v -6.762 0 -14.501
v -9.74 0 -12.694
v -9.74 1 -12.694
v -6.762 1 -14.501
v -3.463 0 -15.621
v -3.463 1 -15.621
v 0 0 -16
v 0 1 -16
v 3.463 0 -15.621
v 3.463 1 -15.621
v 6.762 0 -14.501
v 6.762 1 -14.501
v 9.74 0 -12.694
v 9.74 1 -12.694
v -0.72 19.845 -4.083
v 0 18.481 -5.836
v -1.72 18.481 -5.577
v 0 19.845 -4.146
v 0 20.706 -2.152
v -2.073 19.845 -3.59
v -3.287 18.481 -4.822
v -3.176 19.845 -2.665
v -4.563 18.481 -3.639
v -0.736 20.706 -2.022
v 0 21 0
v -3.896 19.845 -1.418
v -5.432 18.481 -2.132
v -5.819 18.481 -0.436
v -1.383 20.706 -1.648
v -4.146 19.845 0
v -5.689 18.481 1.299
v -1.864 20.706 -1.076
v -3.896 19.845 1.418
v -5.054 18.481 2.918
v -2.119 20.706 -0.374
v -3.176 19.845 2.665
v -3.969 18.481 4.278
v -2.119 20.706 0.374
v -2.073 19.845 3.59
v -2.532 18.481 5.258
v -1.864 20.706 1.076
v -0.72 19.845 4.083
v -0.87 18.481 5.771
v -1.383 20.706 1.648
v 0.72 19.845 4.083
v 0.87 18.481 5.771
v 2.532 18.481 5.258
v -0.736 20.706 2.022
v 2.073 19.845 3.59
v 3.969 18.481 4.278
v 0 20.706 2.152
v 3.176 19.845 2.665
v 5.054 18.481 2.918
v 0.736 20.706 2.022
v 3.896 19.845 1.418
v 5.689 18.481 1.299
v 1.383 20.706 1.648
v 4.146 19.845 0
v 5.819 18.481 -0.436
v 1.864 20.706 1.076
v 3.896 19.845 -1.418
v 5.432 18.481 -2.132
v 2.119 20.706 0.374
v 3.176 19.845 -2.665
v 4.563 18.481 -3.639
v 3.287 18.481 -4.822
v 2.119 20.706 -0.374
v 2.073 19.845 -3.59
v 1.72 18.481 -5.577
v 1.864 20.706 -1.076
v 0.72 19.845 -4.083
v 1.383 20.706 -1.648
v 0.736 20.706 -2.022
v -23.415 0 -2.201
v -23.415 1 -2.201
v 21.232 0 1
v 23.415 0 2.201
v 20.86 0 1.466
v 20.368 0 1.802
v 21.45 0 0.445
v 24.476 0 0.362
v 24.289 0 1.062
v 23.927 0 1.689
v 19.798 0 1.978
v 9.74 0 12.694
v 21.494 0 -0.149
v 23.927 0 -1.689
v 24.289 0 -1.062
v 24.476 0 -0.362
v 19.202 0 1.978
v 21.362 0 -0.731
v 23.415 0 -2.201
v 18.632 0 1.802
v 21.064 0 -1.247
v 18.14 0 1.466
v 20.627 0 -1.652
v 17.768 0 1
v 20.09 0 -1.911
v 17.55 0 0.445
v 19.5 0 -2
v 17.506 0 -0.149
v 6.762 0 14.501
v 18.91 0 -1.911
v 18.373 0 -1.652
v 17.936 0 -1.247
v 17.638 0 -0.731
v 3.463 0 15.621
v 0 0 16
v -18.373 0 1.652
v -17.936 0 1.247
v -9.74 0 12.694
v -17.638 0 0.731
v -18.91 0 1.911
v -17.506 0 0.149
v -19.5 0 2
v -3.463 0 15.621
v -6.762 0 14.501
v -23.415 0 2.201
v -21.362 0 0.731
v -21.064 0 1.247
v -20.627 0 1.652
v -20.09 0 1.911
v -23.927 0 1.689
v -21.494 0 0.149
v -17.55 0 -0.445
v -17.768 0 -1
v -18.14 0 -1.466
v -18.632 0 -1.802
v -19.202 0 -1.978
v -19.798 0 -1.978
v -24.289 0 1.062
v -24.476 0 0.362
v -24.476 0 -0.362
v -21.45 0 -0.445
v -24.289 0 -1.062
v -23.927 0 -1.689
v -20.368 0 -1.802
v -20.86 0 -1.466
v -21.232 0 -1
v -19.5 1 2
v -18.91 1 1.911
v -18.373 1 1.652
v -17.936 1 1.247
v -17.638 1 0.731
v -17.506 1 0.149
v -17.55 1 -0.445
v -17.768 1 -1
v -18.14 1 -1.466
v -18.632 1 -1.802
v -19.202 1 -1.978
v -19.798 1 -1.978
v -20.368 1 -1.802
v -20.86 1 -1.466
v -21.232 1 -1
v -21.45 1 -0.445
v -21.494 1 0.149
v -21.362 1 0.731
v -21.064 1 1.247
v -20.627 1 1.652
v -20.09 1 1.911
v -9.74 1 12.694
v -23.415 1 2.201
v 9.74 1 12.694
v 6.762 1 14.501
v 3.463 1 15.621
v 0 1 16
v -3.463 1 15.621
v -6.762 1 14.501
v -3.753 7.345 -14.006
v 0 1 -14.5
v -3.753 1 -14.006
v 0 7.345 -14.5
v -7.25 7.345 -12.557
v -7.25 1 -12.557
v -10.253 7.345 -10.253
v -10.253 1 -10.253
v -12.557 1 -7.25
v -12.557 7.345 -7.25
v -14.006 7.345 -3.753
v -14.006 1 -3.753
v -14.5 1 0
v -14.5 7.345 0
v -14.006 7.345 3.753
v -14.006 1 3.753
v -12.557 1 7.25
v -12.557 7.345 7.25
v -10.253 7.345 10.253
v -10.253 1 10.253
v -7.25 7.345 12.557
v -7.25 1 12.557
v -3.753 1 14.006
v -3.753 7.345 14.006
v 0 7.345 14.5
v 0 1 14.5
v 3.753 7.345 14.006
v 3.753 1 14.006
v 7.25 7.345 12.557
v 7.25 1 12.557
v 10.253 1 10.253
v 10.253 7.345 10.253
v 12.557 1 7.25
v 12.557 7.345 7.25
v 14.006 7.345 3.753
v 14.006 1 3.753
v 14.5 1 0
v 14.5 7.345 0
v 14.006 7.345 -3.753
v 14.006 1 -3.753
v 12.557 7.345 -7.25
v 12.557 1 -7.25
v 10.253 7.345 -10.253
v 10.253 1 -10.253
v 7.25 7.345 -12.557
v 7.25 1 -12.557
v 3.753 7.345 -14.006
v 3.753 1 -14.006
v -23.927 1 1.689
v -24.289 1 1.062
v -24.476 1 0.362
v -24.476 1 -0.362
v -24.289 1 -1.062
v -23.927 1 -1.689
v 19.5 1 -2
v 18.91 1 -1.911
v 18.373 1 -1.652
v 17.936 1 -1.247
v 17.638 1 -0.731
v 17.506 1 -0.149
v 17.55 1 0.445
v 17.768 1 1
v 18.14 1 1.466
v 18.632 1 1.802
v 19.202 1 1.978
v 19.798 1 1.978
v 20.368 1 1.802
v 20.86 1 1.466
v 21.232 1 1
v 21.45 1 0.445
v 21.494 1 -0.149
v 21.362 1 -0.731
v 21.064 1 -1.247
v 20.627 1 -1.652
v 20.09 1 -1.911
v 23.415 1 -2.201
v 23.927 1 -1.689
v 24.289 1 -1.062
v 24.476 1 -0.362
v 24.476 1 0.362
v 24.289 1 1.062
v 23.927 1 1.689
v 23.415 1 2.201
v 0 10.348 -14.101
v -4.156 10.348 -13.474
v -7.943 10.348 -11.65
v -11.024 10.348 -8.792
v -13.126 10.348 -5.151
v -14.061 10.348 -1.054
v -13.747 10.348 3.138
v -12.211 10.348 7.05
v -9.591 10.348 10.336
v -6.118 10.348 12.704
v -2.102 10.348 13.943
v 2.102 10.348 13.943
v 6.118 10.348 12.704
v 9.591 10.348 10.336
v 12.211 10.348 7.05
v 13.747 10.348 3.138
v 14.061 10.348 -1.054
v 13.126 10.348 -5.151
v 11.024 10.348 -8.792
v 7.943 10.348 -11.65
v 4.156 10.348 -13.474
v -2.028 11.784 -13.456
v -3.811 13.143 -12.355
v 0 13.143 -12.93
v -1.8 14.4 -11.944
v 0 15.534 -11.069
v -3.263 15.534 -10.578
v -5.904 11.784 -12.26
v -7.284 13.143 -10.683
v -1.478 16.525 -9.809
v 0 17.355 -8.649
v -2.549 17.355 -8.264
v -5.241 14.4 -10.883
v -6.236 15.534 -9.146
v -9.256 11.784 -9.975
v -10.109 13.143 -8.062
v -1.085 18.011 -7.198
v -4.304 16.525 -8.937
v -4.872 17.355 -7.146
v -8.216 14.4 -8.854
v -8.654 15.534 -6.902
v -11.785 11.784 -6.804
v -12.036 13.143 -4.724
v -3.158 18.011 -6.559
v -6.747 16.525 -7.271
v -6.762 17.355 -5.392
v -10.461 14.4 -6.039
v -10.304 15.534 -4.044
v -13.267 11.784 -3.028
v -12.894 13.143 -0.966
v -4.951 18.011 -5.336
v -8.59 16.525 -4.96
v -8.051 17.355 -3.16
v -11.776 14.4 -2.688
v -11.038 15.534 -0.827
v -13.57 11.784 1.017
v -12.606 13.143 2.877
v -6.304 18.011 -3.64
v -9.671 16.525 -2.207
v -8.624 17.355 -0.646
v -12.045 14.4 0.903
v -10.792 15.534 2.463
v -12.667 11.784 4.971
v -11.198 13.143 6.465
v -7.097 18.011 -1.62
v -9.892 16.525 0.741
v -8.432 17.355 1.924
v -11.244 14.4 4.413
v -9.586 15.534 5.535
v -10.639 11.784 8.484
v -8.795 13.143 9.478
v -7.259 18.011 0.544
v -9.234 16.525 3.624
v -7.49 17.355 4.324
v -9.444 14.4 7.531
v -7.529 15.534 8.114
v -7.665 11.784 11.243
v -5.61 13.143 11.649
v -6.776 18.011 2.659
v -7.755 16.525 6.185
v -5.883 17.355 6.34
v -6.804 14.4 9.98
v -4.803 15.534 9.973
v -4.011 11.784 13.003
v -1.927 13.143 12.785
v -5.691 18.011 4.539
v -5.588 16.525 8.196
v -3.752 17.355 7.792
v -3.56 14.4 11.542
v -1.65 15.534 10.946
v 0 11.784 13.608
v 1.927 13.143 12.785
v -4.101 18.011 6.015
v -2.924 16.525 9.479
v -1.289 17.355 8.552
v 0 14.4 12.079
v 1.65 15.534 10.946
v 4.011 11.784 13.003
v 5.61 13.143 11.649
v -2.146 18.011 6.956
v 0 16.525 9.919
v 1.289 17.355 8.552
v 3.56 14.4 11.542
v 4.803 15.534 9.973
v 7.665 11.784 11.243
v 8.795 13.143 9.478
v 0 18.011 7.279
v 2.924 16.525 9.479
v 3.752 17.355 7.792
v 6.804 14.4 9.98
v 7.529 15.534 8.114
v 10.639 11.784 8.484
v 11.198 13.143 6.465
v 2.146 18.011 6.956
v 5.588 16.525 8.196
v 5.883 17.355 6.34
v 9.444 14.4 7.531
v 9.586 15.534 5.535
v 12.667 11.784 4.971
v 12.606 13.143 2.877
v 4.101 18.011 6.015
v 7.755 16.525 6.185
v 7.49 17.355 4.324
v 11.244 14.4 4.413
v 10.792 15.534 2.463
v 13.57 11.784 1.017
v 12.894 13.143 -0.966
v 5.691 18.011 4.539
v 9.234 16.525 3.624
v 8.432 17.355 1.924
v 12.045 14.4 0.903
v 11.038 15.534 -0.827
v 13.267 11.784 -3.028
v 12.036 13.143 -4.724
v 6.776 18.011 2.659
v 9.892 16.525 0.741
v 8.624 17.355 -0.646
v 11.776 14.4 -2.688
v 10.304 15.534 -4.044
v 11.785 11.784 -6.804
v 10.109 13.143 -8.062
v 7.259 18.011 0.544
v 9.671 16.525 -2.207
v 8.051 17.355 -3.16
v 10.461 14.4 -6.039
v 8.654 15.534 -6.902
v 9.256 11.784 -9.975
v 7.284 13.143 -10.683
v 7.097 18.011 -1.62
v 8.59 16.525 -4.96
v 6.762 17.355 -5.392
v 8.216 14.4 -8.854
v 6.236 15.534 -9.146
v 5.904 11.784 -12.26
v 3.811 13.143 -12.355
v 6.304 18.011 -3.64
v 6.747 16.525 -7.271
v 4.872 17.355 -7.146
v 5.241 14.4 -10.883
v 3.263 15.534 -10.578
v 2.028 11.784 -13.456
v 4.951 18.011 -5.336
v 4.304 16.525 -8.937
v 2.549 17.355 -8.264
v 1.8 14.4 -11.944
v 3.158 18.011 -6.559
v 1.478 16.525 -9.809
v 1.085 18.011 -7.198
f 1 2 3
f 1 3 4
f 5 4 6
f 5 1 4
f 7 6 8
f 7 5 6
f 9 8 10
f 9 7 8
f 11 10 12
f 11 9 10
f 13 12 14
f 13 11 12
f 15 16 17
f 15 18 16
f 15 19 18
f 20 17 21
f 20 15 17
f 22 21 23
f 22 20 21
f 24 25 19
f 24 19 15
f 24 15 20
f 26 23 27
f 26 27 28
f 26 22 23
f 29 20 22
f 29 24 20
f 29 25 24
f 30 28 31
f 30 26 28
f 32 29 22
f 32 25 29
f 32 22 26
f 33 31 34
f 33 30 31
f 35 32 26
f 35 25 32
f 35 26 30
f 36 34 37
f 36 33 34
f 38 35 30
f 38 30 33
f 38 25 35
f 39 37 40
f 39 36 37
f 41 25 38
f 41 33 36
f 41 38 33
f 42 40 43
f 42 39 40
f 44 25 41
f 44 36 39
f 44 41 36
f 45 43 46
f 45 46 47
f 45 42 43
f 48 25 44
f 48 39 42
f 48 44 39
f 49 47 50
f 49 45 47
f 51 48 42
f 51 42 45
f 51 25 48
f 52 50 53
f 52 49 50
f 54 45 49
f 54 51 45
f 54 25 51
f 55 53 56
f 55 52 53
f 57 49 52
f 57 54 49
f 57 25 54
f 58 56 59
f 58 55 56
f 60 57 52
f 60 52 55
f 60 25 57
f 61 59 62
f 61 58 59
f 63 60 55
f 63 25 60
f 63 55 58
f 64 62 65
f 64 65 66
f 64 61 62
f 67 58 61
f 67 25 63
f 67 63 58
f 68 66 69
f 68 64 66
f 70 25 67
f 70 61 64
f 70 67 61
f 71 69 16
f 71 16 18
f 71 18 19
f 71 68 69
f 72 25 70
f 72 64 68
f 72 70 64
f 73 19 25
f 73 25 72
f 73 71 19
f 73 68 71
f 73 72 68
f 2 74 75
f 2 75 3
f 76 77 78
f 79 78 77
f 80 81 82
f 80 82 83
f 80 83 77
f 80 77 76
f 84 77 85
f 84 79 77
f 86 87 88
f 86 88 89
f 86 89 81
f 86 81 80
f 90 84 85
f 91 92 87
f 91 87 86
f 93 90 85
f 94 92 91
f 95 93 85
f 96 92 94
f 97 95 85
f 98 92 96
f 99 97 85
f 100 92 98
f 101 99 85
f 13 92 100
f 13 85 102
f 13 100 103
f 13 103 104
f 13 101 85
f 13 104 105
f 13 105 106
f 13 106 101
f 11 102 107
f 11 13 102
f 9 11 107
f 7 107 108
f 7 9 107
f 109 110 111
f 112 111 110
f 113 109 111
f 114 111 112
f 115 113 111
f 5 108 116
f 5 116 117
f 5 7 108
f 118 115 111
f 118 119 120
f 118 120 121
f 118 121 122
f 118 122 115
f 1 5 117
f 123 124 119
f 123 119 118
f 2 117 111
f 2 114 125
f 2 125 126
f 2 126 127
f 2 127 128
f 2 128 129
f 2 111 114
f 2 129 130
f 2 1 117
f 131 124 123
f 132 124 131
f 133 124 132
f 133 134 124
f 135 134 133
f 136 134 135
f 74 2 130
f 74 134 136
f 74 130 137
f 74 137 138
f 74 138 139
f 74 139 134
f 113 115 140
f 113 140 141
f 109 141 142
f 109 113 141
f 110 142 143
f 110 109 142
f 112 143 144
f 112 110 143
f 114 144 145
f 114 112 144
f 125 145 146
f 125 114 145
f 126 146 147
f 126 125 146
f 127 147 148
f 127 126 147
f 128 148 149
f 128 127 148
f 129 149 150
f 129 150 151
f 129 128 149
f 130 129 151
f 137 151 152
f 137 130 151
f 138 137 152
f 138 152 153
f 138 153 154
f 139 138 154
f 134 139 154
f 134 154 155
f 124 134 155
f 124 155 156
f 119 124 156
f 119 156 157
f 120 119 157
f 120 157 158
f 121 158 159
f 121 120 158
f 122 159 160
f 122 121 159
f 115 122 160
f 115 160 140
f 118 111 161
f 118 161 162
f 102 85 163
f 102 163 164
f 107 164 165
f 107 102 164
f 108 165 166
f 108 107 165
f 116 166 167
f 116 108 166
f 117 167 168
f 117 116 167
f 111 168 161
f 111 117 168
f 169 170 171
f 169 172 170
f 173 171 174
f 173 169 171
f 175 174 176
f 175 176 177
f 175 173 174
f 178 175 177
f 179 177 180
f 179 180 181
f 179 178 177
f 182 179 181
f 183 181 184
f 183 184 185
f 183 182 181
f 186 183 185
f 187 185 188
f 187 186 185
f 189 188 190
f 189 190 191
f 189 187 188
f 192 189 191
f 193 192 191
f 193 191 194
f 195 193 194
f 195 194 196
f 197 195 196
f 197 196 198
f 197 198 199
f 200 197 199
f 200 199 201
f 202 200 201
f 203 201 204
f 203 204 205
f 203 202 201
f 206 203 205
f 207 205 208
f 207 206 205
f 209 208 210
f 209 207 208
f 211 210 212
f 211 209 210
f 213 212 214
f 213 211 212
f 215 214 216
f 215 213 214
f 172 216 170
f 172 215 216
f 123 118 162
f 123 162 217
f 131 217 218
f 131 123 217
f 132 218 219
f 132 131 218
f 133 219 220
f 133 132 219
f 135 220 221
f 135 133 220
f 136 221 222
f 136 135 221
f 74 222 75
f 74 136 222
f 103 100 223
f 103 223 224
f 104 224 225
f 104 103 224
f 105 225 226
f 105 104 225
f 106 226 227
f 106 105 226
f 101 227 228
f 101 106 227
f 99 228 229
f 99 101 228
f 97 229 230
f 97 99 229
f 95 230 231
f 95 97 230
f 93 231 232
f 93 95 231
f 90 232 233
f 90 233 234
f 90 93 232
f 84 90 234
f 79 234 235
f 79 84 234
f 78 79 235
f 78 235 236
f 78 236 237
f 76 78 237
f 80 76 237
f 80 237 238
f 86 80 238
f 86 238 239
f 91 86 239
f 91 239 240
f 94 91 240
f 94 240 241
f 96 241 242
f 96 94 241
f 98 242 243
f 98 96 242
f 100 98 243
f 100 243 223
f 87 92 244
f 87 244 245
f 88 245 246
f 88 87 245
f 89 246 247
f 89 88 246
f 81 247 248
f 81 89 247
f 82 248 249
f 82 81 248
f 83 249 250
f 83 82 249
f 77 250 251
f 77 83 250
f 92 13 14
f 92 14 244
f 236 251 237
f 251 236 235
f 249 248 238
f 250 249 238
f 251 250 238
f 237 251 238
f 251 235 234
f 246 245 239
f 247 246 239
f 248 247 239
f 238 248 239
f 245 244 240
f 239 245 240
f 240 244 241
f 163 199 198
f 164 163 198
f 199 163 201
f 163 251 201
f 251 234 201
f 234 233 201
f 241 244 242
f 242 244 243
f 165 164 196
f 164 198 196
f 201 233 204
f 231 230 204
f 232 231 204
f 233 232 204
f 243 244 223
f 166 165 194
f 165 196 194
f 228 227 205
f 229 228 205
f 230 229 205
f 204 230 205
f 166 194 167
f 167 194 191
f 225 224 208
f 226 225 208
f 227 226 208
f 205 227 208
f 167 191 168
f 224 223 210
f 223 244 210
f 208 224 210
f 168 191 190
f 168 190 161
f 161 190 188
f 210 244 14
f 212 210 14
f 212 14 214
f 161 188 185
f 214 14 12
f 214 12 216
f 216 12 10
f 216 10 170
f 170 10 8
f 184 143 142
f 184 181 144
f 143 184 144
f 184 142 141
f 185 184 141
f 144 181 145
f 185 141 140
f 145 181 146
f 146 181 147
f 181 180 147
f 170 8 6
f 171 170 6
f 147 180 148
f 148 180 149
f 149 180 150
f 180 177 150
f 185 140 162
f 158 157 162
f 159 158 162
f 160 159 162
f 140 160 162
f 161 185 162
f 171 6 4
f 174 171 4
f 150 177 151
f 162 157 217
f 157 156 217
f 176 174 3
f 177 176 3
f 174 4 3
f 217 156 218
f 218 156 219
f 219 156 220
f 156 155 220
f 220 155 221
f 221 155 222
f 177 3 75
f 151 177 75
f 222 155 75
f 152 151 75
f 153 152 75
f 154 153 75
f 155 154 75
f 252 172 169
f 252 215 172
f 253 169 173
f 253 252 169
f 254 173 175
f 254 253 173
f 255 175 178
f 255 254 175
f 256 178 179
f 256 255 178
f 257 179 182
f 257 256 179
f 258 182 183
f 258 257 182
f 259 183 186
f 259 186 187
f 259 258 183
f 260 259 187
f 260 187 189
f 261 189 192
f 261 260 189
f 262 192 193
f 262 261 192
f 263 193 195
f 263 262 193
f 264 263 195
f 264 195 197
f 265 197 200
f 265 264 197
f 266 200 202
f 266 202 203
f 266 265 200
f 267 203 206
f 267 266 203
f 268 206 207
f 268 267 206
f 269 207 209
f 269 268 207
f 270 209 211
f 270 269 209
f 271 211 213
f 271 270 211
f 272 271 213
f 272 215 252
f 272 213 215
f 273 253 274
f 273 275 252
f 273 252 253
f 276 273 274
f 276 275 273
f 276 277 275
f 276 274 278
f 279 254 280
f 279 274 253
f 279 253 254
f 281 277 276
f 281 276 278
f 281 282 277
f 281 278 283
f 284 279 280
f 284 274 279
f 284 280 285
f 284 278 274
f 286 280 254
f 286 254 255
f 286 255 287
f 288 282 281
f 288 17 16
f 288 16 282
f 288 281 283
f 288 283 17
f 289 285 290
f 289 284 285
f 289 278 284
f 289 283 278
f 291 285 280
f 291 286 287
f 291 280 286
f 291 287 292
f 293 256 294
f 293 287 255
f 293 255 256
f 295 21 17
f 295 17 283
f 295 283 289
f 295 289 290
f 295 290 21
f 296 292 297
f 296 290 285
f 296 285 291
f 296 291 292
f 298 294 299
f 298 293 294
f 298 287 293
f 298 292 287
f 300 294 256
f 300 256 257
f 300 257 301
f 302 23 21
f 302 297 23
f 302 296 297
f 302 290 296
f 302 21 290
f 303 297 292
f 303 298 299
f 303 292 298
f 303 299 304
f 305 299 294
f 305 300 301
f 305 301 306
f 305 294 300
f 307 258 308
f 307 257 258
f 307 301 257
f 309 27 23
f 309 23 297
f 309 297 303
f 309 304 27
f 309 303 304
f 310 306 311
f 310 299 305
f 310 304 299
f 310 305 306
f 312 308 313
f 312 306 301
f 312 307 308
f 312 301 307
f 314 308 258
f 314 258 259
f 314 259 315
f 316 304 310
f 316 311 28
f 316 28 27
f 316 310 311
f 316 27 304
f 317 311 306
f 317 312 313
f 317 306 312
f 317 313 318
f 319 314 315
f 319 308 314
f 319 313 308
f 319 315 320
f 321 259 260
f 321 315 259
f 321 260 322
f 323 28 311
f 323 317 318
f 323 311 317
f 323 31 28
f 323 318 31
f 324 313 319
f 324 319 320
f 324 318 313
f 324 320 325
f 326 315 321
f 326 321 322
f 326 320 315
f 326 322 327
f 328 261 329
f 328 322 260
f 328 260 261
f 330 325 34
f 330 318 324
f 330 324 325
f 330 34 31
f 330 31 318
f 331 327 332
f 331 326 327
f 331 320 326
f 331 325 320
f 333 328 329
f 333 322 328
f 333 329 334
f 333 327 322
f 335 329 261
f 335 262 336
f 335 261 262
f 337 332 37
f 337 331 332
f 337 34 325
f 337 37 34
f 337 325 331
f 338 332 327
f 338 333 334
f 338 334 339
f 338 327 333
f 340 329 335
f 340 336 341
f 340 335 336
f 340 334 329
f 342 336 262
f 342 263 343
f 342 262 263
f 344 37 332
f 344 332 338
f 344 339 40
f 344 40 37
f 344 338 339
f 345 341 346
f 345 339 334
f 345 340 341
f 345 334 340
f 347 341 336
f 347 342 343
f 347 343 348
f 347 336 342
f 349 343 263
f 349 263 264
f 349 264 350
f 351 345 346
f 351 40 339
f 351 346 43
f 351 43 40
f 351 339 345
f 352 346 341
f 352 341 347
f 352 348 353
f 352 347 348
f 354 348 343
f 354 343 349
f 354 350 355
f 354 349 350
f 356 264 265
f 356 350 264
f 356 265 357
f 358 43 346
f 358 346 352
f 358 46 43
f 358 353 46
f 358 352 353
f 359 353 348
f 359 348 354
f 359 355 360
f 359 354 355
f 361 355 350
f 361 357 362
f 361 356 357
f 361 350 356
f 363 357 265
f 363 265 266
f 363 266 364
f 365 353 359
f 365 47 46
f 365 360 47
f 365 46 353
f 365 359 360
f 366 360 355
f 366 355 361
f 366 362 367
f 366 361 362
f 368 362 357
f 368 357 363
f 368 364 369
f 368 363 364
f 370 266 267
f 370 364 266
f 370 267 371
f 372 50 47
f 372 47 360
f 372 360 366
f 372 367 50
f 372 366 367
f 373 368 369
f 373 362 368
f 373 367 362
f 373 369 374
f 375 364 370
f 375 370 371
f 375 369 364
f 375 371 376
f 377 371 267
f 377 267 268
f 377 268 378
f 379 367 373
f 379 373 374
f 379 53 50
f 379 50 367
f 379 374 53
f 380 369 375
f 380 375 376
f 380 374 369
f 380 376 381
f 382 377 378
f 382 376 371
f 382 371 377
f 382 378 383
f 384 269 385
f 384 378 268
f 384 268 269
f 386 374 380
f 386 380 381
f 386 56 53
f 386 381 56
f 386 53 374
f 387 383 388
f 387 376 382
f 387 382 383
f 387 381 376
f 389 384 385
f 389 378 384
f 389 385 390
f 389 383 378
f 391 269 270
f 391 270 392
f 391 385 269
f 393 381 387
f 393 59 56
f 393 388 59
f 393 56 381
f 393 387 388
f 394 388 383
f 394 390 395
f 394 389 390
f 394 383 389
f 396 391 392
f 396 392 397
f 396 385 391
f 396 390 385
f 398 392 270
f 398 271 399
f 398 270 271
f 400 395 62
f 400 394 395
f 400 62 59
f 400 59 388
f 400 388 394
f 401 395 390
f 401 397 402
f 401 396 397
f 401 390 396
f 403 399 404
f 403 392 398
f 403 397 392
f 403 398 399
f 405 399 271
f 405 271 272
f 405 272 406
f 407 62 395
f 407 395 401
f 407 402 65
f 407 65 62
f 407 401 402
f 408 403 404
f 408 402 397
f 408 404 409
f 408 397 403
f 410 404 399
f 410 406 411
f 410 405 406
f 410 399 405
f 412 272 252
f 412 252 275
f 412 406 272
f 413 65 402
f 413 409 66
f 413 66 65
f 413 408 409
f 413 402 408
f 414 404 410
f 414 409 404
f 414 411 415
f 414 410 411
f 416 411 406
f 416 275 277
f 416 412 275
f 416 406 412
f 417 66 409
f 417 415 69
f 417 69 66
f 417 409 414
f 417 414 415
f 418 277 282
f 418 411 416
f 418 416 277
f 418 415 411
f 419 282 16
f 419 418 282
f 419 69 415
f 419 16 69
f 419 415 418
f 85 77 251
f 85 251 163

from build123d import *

# Parameters (mm, degrees)
SKETCH1_R           = 2
BOSS_EXTRUDE1_DEPTH = 1


with BuildPart() as part:
    # Sketch1 → Boss-Extrude1 (new body)
    with BuildSketch(Plane(origin=(0, 0, 0), x_dir=(1, 0, 0), z_dir=(0, 1, 0))):
        with BuildLine():
            Line((-23.414655011, 2.20086192), (-9.740182864, 12.693653445))
            ThreePointArc((-9.740182864, 12.693653445), (0, 16), (9.740182864, 12.693653445))
            Line((9.740182864, 12.693653445), (23.414655011, 2.20086192))
            ThreePointArc((23.414655011, 2.20086192), (24.5, 0), (23.414655011, -2.20086192))
            Line((23.414655011, -2.20086192), (9.740182864, -12.693653445))
            ThreePointArc((9.740182864, -12.693653445), (0, -16), (-9.740182864, -12.693653445))
            Line((-9.740182864, -12.693653445), (-23.414655011, -2.20086192))
            ThreePointArc((-23.414655011, -2.20086192), (-24.5, 0), (-23.414655011, 2.20086192))
        make_face()
        with Locations(Location((-19.5, 0, 0), (0, 0, 270))):
            Circle(SKETCH1_R, mode=Mode.SUBTRACT)
        with Locations(Location((19.5, 0, 0), (0, 0, 90))):
            Circle(SKETCH1_R, mode=Mode.SUBTRACT)
    extrude(amount=BOSS_EXTRUDE1_DEPTH)

    # Sketch2 → Revolve1 (revolve)
    with BuildSketch(Plane.XY, mode=Mode.PRIVATE) as revolve1_sk:
        with BuildLine():
            Line((0, 6.082034509), (0, 1))
            Line((0, 1), (-14.5, 1))
            Line((-14.5, 1), (-14.5, 7.345083381))
            ThreePointArc((-14.5, 7.345083381), (-12.078795143, 14.399662879), (-5.835769403, 18.480588566))
            ThreePointArc((-5.835769403, 18.480588566), (-3.178192824, 20.343251845), (0, 21))
            Line((0, 21), (0, 6.082034509))
        make_face()
    revolve(revolve1_sk.sketch.rotate(Axis((0, 0, 0), (0, 1, 0)), 270), axis=Axis((0, 0, 0), (0, 1, 0)))


solid = part.part
